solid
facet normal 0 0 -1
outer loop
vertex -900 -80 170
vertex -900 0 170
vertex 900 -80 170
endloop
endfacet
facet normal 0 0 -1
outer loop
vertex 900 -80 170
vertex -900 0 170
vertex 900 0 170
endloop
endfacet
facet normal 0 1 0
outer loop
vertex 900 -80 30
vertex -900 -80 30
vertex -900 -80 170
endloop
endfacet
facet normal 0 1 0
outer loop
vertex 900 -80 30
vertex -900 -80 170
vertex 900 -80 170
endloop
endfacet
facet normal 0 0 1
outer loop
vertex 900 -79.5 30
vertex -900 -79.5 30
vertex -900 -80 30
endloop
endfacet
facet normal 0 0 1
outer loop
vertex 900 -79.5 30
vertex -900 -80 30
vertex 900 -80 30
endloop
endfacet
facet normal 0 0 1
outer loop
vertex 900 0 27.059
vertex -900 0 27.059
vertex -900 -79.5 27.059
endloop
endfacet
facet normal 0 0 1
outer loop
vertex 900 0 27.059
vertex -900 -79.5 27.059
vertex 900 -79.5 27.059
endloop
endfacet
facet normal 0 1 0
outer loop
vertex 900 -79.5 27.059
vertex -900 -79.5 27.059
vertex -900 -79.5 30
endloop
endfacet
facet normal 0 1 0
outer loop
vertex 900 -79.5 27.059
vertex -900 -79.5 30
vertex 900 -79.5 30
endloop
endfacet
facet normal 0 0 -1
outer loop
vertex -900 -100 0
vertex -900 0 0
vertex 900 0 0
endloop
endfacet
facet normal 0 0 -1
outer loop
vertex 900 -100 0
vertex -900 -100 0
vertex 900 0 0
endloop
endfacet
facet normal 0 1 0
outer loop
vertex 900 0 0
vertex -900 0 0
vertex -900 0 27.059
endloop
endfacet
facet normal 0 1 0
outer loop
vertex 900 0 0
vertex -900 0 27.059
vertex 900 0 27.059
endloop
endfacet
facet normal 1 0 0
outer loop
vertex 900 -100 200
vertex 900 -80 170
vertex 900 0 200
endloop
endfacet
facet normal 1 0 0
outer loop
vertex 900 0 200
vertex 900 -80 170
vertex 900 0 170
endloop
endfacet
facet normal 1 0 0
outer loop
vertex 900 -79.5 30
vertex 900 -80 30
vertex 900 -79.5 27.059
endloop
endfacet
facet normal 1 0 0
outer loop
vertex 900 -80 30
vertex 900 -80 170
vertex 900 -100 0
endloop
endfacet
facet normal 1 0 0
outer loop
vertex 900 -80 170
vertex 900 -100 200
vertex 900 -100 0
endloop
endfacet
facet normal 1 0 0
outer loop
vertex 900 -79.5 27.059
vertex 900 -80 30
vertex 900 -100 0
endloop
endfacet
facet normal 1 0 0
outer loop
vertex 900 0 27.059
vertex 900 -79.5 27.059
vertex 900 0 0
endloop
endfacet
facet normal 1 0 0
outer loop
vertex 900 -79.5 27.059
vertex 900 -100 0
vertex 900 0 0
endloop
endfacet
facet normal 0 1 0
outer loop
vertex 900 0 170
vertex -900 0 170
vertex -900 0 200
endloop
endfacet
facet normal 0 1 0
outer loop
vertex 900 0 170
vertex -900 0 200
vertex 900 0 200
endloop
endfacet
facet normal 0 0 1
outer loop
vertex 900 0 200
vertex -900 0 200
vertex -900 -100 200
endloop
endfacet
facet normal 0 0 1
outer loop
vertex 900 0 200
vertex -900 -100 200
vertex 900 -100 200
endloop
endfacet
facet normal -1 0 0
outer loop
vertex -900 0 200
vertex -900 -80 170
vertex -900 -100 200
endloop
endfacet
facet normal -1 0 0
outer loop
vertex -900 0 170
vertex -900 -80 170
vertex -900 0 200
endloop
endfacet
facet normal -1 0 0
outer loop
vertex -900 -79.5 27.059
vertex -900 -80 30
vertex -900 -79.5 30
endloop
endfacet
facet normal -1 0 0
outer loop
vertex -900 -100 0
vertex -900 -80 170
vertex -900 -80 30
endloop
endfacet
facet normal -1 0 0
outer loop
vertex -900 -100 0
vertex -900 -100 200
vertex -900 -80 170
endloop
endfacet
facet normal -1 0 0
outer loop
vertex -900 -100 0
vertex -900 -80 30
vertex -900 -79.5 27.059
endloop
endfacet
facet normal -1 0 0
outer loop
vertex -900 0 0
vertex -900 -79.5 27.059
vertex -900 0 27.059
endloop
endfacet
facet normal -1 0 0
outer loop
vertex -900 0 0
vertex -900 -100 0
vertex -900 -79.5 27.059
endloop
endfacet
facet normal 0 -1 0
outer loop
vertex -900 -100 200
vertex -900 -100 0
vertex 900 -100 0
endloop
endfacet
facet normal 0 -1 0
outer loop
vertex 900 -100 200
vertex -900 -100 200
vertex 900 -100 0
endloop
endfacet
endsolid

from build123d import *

# Parameters (mm, degrees)
ESQUISSE1_W             = 1800
ESQUISSE1_H             = 100
BOSS_EXTRU_1_DEPTH      = 200
ESQUISSE2_W             = 1800
ESQUISSE2_H             = 140
ENL_V_MAT_EXTRU_1_DEPTH = 80
ESQUISSE4_W             = 1800
ESQUISSE4_H             = 2.941473276
ENL_V_MAT_EXTRU_2_DEPTH = 79.5


with BuildPart() as part:
    # Esquisse1 → Boss.-Extru.1 (new body)
    with BuildSketch(Plane.XY):
        with Locations((0, -50)):
            Rectangle(ESQUISSE1_W, ESQUISSE1_H)
    extrude(amount=BOSS_EXTRU_1_DEPTH)

    # Esquisse2 → Enlèv. mat.-Extru.1 (cut)
    with BuildSketch(Plane(origin=(0, 0, 0), x_dir=(1, 0, 0), z_dir=(0, 1, 0))):
        with Locations((0, -100)):
            Rectangle(ESQUISSE2_W, ESQUISSE2_H)
    extrude(amount=-ENL_V_MAT_EXTRU_1_DEPTH, mode=Mode.SUBTRACT)

    # Esquisse4 → Enlèv. mat.-Extru.2 (cut)
    with BuildSketch(Plane(origin=(0, 0, 0), x_dir=(1, 0, 0), z_dir=(0, 1, 0))):
        with Locations((0, -28.529263362)):
            Rectangle(ESQUISSE4_W, ESQUISSE4_H)
    extrude(amount=-ENL_V_MAT_EXTRU_2_DEPTH, mode=Mode.SUBTRACT)


solid = part.part
